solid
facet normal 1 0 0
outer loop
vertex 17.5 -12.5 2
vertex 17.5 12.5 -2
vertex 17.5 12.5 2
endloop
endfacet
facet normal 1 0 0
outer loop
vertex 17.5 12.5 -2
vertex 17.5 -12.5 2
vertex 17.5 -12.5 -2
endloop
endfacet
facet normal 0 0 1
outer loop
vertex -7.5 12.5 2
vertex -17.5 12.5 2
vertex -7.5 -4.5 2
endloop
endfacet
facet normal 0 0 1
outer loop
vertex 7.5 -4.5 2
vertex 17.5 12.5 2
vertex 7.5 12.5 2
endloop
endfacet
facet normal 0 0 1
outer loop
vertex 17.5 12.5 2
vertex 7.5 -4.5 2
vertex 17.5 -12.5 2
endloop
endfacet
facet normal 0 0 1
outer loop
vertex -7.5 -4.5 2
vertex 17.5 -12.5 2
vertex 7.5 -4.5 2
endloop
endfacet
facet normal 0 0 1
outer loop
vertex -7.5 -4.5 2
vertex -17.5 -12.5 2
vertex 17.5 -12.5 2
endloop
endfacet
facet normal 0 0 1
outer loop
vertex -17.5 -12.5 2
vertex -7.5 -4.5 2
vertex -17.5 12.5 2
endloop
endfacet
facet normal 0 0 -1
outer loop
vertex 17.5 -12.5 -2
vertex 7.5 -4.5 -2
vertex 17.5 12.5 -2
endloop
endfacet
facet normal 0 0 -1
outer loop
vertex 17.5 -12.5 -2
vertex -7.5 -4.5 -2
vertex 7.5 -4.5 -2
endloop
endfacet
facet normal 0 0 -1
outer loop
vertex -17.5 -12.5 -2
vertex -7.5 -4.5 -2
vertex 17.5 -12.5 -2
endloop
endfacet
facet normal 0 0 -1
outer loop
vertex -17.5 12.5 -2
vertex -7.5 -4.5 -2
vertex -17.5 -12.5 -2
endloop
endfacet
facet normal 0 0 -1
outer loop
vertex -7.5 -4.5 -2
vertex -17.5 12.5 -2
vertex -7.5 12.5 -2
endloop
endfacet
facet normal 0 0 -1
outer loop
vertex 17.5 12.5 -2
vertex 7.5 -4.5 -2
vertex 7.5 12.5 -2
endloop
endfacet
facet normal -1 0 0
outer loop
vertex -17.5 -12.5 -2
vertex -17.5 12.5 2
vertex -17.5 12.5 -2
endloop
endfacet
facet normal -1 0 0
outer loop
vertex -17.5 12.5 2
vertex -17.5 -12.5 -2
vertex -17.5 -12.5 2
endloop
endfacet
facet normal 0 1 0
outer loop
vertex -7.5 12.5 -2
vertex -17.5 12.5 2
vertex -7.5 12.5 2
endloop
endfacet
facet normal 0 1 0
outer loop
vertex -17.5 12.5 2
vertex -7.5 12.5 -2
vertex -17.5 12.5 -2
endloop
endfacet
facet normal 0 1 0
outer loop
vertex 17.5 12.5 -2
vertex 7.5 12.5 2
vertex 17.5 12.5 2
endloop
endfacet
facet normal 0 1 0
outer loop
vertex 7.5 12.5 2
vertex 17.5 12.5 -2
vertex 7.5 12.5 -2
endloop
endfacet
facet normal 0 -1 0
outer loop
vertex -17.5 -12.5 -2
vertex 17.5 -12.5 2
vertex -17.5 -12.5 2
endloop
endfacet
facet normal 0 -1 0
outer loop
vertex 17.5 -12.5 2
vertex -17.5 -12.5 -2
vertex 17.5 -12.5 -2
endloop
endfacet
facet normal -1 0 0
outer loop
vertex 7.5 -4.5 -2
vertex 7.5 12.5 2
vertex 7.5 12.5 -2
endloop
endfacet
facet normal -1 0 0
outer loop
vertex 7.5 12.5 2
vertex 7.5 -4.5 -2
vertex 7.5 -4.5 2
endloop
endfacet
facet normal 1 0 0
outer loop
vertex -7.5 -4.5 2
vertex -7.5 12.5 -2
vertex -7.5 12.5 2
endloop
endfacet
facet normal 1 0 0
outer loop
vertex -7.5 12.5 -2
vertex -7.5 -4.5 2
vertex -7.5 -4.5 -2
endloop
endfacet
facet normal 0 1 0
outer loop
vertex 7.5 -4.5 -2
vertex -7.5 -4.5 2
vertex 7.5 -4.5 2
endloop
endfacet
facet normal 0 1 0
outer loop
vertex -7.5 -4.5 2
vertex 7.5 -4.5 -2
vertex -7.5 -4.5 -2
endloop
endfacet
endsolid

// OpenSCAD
difference () {
	cube( [ 35, 25, 4 ], center = true );
	translate ( [ 0, 4.05, -0.1 ] )
#		cube( [ 15, 17.1, 4.3 ], center = true );
}
